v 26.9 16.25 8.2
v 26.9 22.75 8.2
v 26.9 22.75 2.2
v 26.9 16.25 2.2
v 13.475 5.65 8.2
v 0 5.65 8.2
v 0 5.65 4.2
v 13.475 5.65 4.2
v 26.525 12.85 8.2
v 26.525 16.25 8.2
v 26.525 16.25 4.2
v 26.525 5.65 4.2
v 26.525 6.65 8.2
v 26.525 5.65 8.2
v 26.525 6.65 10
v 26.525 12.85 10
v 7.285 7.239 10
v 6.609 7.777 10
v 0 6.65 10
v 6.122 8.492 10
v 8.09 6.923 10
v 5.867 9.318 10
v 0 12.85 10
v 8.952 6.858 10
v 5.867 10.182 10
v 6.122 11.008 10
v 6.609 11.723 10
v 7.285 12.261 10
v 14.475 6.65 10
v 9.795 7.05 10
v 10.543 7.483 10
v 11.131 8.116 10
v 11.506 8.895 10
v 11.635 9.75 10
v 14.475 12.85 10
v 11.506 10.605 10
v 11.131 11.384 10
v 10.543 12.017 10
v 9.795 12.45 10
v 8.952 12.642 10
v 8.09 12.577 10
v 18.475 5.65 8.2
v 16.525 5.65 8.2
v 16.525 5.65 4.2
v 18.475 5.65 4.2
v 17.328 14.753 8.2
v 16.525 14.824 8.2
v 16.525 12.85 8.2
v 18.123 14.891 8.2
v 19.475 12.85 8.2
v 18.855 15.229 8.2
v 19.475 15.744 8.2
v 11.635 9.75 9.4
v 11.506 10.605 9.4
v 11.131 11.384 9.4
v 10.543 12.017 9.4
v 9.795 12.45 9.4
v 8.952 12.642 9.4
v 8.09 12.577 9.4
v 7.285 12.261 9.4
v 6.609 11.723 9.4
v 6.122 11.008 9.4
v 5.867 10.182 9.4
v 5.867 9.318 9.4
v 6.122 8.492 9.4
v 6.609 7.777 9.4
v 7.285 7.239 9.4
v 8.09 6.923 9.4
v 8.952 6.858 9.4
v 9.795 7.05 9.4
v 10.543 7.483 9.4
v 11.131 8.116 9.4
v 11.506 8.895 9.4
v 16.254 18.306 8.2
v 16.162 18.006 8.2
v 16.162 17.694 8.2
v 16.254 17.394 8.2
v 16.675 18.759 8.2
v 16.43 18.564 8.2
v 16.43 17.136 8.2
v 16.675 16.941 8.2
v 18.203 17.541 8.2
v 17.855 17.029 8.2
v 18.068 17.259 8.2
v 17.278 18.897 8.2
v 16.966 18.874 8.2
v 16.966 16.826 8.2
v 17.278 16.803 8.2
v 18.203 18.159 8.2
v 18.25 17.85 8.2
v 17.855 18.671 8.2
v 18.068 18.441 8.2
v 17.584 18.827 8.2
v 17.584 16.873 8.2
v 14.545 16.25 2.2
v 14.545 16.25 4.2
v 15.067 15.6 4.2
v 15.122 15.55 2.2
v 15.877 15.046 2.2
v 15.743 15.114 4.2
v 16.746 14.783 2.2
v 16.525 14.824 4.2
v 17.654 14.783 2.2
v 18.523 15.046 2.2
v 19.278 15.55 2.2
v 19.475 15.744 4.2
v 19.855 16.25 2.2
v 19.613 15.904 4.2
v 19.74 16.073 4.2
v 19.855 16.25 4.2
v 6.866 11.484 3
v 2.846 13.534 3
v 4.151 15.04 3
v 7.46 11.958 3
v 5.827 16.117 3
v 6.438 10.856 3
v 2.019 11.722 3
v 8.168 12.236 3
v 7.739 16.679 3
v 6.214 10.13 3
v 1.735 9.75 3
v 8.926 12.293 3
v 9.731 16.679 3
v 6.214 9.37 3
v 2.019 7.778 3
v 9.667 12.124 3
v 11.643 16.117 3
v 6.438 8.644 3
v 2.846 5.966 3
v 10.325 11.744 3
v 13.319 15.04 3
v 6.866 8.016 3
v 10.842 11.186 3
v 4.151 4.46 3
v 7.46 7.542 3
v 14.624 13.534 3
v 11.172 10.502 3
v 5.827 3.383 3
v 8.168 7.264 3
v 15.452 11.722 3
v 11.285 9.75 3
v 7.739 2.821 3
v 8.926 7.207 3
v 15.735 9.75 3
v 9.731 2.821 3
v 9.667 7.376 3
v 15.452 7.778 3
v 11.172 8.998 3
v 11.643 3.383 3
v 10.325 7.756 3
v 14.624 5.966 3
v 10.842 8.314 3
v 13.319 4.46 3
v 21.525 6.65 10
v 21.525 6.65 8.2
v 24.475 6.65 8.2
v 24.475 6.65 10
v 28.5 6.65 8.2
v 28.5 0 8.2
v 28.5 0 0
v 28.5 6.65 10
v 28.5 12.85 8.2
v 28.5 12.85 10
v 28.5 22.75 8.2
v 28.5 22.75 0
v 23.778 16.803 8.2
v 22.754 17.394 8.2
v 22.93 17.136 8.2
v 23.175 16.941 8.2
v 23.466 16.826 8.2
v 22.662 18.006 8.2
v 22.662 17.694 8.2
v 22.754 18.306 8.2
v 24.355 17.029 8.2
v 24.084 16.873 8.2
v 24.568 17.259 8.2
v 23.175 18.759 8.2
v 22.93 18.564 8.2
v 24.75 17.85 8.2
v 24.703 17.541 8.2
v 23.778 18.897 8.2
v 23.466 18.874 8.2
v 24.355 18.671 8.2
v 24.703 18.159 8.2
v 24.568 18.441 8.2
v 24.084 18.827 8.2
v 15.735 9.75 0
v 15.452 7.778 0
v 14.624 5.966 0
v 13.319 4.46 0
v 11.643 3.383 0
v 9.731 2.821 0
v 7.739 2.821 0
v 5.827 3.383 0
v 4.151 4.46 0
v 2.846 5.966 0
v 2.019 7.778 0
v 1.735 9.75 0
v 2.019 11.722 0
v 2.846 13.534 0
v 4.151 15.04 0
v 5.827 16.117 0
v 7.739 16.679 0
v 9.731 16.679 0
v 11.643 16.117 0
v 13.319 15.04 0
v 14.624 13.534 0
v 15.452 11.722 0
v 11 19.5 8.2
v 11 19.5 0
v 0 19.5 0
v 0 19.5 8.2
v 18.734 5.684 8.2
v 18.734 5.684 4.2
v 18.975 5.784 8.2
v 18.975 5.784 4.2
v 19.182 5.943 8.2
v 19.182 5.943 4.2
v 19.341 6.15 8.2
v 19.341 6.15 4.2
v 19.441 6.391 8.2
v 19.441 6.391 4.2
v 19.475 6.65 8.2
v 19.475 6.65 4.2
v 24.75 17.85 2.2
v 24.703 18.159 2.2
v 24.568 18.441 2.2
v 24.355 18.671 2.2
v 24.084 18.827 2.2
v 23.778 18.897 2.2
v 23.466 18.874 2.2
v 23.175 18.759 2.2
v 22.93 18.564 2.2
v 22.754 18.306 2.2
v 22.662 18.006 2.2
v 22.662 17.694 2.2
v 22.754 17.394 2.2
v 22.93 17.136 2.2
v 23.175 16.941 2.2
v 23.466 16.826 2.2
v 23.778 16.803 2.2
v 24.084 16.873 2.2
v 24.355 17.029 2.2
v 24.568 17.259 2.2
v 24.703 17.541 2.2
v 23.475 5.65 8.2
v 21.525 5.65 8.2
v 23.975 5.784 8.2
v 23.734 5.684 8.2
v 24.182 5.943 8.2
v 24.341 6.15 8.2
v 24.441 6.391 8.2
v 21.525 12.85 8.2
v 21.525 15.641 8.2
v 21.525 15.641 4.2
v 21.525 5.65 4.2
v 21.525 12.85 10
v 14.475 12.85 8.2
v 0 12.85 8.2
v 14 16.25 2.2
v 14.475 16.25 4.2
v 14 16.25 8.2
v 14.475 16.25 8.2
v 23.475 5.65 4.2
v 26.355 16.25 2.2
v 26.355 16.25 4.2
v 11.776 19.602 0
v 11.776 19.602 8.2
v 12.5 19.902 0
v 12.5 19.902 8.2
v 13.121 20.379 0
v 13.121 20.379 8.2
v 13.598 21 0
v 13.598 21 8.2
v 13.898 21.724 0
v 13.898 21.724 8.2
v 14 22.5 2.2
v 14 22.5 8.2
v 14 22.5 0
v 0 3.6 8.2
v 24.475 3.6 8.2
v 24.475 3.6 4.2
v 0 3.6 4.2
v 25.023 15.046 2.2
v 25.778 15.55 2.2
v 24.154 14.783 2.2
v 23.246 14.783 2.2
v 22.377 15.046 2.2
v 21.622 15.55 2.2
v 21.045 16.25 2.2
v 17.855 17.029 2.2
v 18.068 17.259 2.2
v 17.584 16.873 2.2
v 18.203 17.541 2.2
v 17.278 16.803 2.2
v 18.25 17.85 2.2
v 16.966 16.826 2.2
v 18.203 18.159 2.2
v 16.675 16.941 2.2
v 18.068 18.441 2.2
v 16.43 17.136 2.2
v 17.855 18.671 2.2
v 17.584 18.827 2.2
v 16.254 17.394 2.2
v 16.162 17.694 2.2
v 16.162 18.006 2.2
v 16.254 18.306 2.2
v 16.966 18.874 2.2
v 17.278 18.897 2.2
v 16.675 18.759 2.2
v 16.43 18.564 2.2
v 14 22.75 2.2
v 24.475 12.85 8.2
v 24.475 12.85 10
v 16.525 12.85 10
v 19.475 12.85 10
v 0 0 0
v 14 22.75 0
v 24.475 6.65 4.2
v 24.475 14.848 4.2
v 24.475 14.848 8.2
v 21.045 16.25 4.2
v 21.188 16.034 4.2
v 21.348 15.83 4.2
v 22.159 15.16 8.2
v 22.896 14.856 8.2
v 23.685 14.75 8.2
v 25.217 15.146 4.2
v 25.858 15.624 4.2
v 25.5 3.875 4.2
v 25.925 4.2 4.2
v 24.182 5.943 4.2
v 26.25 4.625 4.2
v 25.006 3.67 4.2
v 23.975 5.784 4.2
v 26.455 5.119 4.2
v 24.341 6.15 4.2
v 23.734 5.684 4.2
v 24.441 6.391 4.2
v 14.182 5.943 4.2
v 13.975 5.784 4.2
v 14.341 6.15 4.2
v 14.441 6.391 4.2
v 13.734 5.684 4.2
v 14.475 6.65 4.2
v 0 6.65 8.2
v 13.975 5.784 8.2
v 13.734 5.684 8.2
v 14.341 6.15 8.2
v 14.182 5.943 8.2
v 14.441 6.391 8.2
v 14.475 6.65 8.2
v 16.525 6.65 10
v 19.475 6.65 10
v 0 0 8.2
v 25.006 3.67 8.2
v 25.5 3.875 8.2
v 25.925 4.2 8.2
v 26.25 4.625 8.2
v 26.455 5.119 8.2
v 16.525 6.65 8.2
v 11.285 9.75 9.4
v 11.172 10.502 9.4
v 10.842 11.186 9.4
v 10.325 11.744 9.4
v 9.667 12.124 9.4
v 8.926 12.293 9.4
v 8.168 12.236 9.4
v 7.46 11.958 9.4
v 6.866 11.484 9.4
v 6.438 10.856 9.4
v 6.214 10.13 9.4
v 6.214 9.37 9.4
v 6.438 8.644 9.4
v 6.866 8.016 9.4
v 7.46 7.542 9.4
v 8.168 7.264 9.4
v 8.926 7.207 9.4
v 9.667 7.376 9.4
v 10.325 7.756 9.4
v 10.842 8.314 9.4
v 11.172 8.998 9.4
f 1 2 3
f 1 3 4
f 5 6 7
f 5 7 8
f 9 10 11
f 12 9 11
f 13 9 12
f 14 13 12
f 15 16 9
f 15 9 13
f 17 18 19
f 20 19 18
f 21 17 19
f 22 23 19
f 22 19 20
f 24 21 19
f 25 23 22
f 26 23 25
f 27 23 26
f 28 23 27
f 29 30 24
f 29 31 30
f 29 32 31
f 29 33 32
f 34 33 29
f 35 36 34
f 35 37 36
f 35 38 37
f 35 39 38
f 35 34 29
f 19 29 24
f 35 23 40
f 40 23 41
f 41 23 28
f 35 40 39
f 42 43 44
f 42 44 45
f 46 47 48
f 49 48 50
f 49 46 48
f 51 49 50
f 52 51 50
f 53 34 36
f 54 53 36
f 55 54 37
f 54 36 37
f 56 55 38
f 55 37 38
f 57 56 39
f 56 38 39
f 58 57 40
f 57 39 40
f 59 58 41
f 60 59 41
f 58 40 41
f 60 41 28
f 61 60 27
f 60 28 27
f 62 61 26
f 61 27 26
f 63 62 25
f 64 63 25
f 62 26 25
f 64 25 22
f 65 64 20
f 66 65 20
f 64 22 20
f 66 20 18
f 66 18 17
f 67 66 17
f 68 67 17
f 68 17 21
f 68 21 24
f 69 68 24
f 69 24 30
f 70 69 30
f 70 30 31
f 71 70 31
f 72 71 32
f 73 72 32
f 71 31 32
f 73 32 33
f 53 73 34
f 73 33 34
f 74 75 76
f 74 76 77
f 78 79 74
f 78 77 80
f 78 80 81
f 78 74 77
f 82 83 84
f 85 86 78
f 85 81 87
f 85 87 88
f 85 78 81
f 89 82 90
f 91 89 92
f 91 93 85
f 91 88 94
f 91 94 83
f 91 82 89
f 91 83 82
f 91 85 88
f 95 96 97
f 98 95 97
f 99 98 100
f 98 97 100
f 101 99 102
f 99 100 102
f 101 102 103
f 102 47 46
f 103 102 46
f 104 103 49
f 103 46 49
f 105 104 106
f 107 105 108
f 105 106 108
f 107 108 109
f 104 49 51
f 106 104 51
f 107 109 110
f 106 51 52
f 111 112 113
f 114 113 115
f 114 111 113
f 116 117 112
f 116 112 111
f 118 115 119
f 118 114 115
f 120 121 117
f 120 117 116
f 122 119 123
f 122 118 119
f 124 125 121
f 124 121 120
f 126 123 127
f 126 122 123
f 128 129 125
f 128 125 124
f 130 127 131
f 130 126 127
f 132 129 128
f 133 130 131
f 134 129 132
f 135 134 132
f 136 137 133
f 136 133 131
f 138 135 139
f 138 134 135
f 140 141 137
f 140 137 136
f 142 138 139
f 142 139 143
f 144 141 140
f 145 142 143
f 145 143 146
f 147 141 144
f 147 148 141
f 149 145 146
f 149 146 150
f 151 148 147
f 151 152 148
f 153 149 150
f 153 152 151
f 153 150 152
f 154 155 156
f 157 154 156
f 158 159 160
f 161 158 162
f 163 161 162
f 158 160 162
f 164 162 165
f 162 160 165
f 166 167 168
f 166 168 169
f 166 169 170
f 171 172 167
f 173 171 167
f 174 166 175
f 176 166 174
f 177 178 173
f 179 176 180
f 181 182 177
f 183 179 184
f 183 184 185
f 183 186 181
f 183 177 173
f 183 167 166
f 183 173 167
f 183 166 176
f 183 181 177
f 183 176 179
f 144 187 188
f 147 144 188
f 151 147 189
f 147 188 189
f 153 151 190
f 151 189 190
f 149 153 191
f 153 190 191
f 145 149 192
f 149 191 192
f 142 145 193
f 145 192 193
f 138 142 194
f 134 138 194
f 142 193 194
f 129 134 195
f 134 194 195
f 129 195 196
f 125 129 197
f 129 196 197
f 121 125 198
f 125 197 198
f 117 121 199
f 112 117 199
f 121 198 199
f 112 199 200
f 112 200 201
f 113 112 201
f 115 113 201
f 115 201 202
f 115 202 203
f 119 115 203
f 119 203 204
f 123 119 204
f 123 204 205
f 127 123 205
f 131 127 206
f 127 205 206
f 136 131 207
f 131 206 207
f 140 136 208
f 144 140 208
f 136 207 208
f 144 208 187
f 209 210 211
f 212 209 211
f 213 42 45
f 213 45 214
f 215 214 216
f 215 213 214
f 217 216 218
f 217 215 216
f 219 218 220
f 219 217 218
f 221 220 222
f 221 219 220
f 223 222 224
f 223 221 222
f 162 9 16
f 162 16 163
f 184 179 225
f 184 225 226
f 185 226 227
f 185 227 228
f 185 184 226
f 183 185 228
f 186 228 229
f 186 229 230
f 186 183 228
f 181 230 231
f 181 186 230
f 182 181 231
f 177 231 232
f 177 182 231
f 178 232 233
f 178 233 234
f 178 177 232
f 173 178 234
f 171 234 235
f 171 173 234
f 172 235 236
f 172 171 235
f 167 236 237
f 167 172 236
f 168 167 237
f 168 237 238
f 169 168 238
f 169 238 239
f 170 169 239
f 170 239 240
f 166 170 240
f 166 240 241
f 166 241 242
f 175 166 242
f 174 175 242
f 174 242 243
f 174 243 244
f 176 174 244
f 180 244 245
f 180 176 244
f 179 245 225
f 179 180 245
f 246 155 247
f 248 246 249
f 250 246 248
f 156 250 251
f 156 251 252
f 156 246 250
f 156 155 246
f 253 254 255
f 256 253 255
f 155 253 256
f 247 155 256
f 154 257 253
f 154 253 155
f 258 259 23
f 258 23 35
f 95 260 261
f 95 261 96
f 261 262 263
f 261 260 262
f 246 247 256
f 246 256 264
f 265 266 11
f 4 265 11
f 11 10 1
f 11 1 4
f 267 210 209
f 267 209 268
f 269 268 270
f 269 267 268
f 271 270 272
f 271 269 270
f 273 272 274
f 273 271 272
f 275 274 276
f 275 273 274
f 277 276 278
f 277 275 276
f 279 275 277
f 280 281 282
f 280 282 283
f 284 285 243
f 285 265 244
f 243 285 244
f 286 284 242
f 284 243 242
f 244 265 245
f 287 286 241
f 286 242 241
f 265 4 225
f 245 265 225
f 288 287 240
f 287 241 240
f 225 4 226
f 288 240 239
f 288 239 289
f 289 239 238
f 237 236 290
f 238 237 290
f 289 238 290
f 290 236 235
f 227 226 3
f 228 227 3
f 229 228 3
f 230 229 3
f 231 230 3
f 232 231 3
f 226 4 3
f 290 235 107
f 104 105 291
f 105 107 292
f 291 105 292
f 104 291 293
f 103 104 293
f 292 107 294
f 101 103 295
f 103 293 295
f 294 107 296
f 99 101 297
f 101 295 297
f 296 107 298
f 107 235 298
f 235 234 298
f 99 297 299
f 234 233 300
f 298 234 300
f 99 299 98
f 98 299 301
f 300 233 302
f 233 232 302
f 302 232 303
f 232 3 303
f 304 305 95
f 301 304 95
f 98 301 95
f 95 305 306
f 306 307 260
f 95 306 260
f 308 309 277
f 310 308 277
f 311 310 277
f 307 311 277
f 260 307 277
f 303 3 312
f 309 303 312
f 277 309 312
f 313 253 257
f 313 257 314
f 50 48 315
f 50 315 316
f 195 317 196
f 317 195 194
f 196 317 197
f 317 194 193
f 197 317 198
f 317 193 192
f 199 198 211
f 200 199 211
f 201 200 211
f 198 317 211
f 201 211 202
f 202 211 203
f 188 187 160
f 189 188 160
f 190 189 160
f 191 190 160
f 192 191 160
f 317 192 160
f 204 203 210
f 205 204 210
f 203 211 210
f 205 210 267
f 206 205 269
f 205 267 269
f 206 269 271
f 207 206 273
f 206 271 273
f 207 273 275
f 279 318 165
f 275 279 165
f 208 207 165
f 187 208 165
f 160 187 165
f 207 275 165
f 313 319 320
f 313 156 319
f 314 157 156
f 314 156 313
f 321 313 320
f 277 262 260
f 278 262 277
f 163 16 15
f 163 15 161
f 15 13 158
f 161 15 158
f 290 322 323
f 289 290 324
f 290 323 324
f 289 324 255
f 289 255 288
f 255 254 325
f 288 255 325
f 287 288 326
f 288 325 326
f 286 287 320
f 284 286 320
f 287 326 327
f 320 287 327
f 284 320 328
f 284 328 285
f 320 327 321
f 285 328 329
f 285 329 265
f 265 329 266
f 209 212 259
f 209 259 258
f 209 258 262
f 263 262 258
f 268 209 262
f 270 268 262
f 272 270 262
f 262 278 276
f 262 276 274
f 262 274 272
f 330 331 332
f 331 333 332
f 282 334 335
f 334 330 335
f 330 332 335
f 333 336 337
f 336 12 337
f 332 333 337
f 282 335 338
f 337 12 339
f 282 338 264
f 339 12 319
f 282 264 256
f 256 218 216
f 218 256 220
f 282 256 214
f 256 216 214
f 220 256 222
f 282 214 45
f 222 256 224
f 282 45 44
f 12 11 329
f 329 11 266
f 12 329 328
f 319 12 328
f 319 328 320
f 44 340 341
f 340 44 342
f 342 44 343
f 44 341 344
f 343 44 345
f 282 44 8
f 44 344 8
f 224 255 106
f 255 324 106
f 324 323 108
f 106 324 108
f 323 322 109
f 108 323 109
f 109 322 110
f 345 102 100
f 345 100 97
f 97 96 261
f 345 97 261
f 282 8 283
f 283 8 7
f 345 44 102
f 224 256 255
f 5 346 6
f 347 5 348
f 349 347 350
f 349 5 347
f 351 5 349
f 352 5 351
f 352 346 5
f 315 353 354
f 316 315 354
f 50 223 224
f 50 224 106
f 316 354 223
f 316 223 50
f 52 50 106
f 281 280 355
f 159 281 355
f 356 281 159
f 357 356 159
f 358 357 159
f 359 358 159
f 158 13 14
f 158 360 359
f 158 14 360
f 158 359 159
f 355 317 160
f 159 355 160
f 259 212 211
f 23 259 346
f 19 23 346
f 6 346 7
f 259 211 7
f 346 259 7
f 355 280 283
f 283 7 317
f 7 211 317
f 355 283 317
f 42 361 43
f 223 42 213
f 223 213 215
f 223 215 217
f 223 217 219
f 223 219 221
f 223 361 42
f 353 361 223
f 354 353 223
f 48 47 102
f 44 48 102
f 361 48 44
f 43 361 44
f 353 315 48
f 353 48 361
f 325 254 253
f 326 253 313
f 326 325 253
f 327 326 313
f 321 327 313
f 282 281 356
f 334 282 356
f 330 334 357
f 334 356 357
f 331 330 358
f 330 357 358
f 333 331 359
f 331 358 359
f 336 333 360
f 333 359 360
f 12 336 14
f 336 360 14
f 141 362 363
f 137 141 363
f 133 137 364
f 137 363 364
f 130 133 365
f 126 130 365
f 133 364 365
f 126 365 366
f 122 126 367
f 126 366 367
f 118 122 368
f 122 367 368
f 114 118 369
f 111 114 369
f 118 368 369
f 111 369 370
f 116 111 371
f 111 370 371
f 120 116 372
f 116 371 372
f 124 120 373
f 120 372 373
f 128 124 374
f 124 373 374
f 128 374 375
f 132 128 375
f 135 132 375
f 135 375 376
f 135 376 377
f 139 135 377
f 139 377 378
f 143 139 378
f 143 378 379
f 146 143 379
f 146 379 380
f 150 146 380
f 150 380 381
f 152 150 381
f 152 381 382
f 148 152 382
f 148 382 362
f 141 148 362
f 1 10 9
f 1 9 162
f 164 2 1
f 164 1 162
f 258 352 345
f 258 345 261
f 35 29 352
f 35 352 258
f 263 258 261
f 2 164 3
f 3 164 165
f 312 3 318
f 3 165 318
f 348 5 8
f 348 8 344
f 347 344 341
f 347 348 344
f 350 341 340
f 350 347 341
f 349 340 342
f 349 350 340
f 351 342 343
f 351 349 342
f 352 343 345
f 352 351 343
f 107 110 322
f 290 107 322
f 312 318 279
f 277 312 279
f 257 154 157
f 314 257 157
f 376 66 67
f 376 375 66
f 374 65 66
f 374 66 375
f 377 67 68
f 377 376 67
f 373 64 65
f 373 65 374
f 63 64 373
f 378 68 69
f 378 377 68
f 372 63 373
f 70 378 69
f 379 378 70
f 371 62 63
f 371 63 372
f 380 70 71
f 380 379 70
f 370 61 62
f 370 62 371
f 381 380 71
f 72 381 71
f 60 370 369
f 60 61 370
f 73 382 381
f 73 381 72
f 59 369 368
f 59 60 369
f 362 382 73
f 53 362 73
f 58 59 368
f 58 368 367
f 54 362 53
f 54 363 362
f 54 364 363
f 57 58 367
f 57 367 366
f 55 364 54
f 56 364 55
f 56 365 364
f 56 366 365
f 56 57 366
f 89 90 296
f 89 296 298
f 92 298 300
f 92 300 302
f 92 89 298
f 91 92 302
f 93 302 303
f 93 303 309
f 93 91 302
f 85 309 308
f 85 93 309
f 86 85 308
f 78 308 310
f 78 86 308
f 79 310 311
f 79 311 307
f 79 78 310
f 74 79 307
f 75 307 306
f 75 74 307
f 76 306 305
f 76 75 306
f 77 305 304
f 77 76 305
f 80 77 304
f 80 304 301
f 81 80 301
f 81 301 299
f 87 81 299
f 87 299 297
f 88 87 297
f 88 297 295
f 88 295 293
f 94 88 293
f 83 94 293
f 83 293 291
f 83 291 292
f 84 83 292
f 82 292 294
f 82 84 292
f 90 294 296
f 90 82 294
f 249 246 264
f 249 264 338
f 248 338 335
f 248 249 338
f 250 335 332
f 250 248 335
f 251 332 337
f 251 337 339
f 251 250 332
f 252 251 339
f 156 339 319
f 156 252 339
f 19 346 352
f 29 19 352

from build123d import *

# Parameters (mm, degrees)
PAD004_DEPTH    = 8.2
SKETCH014_W     = 28.5
SKETCH014_H     = 6.2
PAD005_DEPTH    = 1.8
SKETCH015_R     = 2.9
POCKET004_DEPTH = 0.6
SKETCH016_W     = 2.05
SKETCH016_H     = 6.2
POCKET005_DEPTH = 1.8
SKETCH018_R     = 1.05
POCKET007_DEPTH = 6
POCKET006_DEPTH = 4
SKETCH019_R     = 2.55
POCKET008_DEPTH = 7.5
SKETCH020_R     = 7
POCKET_DEPTH    = 3


with BuildPart() as stage_1_railguide:
    # Sketch013 → Pad004 (new body)
    with BuildSketch(Plane.XY):
        with BuildLine():
            Line((0, 0), (28.5, 0))
            Line((28.5, 0), (28.5, 22.75))
            Line((28.5, 22.75), (14, 22.75))
            Line((14, 22.75), (14, 22.5))
            ThreePointArc((11, 19.5), (13.12132, 20.37868), (14, 22.5))
            Line((11, 19.5), (0, 19.5))
            Line((0, 19.5), (0, 0))
        make_face()
    extrude(amount=PAD004_DEPTH)

    # Sketch014 (on Face9 of Pad004) → Pad005 (join)
    with BuildSketch(Plane.XY.offset(8.2)):
        with Locations((14.25, 9.75)):
            Rectangle(SKETCH014_W, SKETCH014_H)
    extrude(amount=PAD005_DEPTH)

    # Sketch015 (on Face11 of Pad005) → Pocket004 (cut)
    with BuildSketch(Plane.XY.offset(10)):
        with Locations((8.735056, 9.75)):
            Circle(SKETCH015_R)
    extrude(amount=-POCKET004_DEPTH, mode=Mode.SUBTRACT)

    # Sketch016 (on Face10 of Pocket004) → Pocket005 (cut)
    with BuildSketch(Plane.XY.offset(10)):
        with Locations((15.5, 9.75)):
            Rectangle(SKETCH016_W, SKETCH016_H)
        Polygon((21.525, 12.85), (21.525, 6.65), (19.475, 6.65), (19.475, 12.85), (20.5, 12.85), align=None)
        with Locations((25.5, 9.75)):
            Rectangle(SKETCH016_W, SKETCH016_H)
    extrude(amount=-POCKET005_DEPTH, mode=Mode.SUBTRACT)


with BuildPart() as body:
    # Body006 base: copy of Stage#1(RailGuide)
    add(stage_1_railguide.part)

    # Sketch018 (on Face19 of Clone001) → Pocket007 (cut)
    with BuildSketch(Plane.XY.offset(8.2)):
        with BuildLine():
            Line((14, 22.75), (26.9, 22.75))
            Line((26.9, 22.75), (26.9, 16.25))
            Line((26.355184, 16.25), (26.9, 16.25))
            ThreePointArc((21.044816, 16.25), (23.7, 14.75), (26.355184, 16.25))
            Line((20.45, 16.25), (21.044816, 16.25))
            Line((19.855184, 16.25), (20.45, 16.25))
            ThreePointArc((14.544816, 16.25), (17.2, 14.75), (19.855184, 16.25))
            Line((14, 16.25), (14.544816, 16.25))
            Line((14, 16.25), (14, 22.75))
        make_face()
        with Locations((17.2, 17.85)):
            Circle(SKETCH018_R, mode=Mode.SUBTRACT)
        with Locations((23.7, 17.85)):
            Circle(SKETCH018_R, mode=Mode.SUBTRACT)
    extrude(amount=-POCKET007_DEPTH, mode=Mode.SUBTRACT)


with BuildPart() as body008:
    # Body005 base: copy of Stage#1(RailGuide)
    add(stage_1_railguide.part)

    # Sketch017 (on Face19 of Clone) → Pocket006 (cut)
    with BuildSketch(Plane.XY.offset(8.2)):
        with BuildLine():
            Line((0, 5.65), (13.475, 5.65))
            ThreePointArc((13.475, 5.65), (14.182107, 5.942893), (14.475, 6.65))
            Line((14.475, 6.65), (14.475, 16.75))
            Line((14.475, 16.75), (16.525, 16.75))
            Line((16.525, 16.75), (16.525, 5.65))
            Line((16.525, 5.65), (18.475, 5.65))
            ThreePointArc((18.475, 5.65), (19.182107, 5.942893), (19.475, 6.65))
            Line((19.475, 6.65), (19.475, 16.75))
            Line((19.475, 16.75), (21.525, 16.75))
            Line((21.525, 16.75), (21.525, 5.649972))
            Line((21.525, 5.649972), (23.475, 5.649972))
            ThreePointArc((23.475, 5.649972), (24.182107, 5.942865), (24.475, 6.649972))
            Line((24.475, 6.649972), (24.475, 16.75))
            Line((24.475, 16.75), (26.525, 16.75))
            Line((26.525, 16.75), (26.525, 5.65))
            ThreePointArc((24.475, 3.6), (25.924569, 4.200431), (26.525, 5.65))
            Line((24.475, 3.6), (0, 3.6))
            Line((0, 3.6), (0, 5.65))
        make_face()
    extrude(amount=-POCKET006_DEPTH, mode=Mode.SUBTRACT)

    # Sketch019 (on Face37 of Pocket006) → Pocket008 (cut)
    with BuildSketch(Plane.XY.offset(9.4)):
        with Locations((8.735056, 9.75)):
            Circle(SKETCH019_R)
    extrude(amount=-POCKET008_DEPTH, mode=Mode.SUBTRACT)

    # Sketch020 (on Face4 of Pocket008) → Pocket (cut)
    with BuildSketch(Plane(origin=(0, 0, 0), x_dir=(1, 0, 0), z_dir=(0, 0, -1))):
        with Locations((8.735056, -9.75)):
            Circle(SKETCH020_R)
    extrude(amount=-POCKET_DEPTH, mode=Mode.SUBTRACT)

    # Common: intersect Body
    add(body.part, mode=Mode.INTERSECT)


solid = body008.part
